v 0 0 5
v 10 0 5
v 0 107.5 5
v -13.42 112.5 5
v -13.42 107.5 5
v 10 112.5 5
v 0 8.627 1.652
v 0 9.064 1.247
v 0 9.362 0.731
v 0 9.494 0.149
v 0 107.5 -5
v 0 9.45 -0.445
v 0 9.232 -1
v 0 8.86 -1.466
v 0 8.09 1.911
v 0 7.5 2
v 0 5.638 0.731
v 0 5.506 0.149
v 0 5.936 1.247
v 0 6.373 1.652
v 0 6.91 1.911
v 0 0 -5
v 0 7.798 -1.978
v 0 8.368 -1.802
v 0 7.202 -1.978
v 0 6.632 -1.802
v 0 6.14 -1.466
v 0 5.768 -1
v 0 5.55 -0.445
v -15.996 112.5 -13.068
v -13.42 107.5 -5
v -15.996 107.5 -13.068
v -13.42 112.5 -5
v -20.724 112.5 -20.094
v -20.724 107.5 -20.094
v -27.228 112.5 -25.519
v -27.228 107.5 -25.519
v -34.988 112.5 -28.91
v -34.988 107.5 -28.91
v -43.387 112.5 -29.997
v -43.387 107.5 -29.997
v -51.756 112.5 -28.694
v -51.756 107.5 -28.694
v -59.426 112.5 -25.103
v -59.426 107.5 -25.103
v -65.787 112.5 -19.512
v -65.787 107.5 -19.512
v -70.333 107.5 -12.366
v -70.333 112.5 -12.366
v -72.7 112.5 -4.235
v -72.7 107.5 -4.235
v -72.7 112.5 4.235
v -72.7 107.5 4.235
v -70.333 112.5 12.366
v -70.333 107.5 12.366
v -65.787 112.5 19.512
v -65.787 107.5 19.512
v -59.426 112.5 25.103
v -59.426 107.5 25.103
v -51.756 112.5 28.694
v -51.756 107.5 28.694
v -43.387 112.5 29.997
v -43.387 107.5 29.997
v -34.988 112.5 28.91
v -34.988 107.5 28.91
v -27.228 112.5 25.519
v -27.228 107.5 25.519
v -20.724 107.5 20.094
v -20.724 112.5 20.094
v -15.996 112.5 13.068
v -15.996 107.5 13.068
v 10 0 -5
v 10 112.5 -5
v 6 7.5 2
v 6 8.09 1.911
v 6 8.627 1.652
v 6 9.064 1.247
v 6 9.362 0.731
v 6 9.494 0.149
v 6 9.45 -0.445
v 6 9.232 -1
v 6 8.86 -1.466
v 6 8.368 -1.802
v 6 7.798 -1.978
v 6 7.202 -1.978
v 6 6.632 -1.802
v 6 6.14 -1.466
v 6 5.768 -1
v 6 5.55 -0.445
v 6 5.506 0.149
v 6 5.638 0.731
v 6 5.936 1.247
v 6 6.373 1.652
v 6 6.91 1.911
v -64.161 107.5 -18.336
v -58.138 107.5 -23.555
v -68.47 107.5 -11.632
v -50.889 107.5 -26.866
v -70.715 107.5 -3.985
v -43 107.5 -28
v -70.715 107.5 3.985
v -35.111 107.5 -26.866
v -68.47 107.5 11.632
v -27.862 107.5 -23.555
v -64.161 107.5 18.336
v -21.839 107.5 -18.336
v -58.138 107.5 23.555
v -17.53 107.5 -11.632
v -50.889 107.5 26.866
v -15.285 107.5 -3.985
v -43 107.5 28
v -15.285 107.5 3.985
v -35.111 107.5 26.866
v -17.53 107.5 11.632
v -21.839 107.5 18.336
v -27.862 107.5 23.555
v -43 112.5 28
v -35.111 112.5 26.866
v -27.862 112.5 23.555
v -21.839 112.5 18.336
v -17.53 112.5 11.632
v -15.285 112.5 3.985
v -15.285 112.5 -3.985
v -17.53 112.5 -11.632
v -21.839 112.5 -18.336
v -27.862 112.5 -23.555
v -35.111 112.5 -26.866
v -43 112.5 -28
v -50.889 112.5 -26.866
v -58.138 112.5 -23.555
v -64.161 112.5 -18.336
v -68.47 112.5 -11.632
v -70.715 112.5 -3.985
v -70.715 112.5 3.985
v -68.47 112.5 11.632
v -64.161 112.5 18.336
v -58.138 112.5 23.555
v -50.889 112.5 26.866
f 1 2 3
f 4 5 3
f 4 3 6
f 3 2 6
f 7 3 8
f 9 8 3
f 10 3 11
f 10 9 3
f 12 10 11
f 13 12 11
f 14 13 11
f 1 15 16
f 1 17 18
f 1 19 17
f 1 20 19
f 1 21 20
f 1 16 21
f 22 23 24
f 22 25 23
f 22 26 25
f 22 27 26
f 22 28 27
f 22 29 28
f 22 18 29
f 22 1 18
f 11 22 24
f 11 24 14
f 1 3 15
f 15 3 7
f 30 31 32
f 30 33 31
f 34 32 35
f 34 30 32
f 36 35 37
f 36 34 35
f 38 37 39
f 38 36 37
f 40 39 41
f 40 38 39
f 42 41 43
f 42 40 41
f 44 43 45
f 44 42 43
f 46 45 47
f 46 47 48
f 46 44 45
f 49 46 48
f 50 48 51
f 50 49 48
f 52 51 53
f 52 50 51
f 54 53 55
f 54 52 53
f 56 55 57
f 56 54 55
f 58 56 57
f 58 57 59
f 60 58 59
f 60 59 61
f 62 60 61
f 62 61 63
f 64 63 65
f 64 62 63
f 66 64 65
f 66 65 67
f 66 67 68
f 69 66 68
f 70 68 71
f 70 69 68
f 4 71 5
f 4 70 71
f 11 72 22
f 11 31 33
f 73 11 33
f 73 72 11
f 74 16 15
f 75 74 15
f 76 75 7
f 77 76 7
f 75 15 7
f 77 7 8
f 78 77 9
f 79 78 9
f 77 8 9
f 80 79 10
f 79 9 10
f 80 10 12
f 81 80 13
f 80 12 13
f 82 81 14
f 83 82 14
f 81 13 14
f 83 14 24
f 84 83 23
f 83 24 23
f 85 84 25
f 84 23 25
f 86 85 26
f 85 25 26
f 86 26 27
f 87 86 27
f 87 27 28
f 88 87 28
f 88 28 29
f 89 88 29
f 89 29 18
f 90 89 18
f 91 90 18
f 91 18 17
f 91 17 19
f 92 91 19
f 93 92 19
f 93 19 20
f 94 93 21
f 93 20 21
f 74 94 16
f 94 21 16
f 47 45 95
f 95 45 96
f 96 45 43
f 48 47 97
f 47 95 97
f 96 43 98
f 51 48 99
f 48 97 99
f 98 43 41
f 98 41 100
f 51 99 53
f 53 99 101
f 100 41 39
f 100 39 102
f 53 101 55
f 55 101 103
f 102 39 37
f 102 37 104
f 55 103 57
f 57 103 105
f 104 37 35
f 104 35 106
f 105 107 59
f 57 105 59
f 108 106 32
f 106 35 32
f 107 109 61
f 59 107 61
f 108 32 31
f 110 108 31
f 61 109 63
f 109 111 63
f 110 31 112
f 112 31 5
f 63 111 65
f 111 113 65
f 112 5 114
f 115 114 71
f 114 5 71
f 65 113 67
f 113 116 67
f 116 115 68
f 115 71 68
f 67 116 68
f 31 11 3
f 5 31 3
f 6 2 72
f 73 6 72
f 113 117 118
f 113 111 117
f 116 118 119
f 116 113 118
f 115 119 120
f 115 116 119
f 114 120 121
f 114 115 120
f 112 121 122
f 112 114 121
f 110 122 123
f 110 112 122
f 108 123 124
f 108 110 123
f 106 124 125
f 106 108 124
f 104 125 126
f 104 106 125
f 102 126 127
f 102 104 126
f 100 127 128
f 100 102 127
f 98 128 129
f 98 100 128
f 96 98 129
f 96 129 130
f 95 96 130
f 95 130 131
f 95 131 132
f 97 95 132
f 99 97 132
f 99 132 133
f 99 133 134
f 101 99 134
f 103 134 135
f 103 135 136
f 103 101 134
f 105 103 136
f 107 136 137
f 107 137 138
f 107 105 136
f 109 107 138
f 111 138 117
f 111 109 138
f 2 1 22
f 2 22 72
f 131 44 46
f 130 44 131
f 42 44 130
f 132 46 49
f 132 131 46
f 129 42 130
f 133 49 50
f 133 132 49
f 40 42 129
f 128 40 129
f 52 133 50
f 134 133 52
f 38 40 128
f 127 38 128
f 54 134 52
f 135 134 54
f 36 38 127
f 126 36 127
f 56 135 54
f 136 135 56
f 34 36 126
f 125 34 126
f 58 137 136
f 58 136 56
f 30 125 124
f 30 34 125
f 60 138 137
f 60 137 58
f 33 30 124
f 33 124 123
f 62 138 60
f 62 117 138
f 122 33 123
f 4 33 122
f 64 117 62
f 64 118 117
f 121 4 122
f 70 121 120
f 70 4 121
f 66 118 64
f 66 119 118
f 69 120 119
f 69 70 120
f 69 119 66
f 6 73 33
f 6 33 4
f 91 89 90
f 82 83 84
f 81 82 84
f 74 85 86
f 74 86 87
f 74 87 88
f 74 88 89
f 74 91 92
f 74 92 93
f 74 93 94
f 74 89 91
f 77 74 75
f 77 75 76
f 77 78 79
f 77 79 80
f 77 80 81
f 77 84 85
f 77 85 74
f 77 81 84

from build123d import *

# Parameters (mm, degrees)
ESQUISSE3_W             = 10
ESQUISSE3_H             = 70
BOSS_EXTRU_1_DEPTH      = 5
ESQUISSE8_R             = 30
ESQUISSE8_R_2           = 28
BOSS_EXTRU_4_DEPTH      = 2.5
ESQUISSE8_W             = 22
ESQUISSE8_H             = 10
BOSS_EXTRU_4_2_DEPTH    = 2.5
BOSS_EXTRU_5_REACH      = 107.494
ESQUISSE9_W             = 10
ESQUISSE9_H             = 10
BOSS_EXTRU_6_REACH      = 133.443
ESQUISSE10_W            = 10
ESQUISSE10_H            = 5
ESQUISSE11_R            = 2
ENL_V_MAT_EXTRU_1_DEPTH = 6


with BuildPart() as part:
    # Esquisse3 → Boss.-Extru.1 (new, symmetric)
    with BuildSketch(Plane.XY):
        with Locations((5, 35)):
            Rectangle(ESQUISSE3_W, ESQUISSE3_H)
    extrude(amount=BOSS_EXTRU_1_DEPTH, both=True)


with BuildPart() as body_2:
    # Esquisse8 → Boss.-Extru.4 (new, symmetric)
    with BuildSketch(Plane(origin=(0, 110, 0), x_dir=(1, 0, 0), z_dir=(0, 1, 0))):
        with Locations(Location((-43, 0, 0), (0, 0, 270))):
            Circle(ESQUISSE8_R)
        with Locations(Location((-43, 0, 0), (0, 0, 270))):
            Circle(ESQUISSE8_R_2, mode=Mode.SUBTRACT)
    extrude(amount=BOSS_EXTRU_4_DEPTH, both=True)

    # Esquisse10 → Boss.-Extru.6 (add, up to next)
    with BuildSketch(Plane.ZY.offset(12), mode=Mode.PRIVATE) as boss_extru_6_sk1:
        with Locations((0, 110)):
            Rectangle(ESQUISSE10_W, ESQUISSE10_H)
    boss_extru_6_tool1 = extrude(boss_extru_6_sk1.sketch, amount=BOSS_EXTRU_6_REACH, mode=Mode.PRIVATE) - body_2.part


with BuildPart() as body_3:
    # Esquisse8 → Boss.-Extru.4 2 (new, symmetric)
    with BuildSketch(Plane(origin=(0, 110, 0), x_dir=(1, 0, 0), z_dir=(0, 1, 0))):
        with Locations((-1, 0)):
            Rectangle(ESQUISSE8_W, ESQUISSE8_H)
    extrude(amount=BOSS_EXTRU_4_2_DEPTH, both=True)

    # Esquisse9 → Boss.-Extru.5 (add, up to next)
    with BuildSketch(Plane(origin=(0, 70, 0), x_dir=(1, 0, 0), z_dir=(0, 1, 0)), mode=Mode.PRIVATE) as boss_extru_5_sk1:
        with Locations((5, 0)):
            Rectangle(ESQUISSE9_W, ESQUISSE9_H)
    boss_extru_5_tool1 = extrude(boss_extru_5_sk1.sketch, amount=BOSS_EXTRU_5_REACH, mode=Mode.PRIVATE) - body_3.part

    add(part.part)  # Boss.-Extru.5 merges part
    add(boss_extru_5_tool1.solids().sort_by_distance((5, 70, 0))[0])


with BuildPart() as body_2_1:
    add(body_2.part)

    add(body_3.part)  # Boss.-Extru.6 merges body 3
    add(boss_extru_6_tool1.solids().sort_by_distance((-12, 110, 0))[0])

    # Esquisse11 → Enlèv. mat.-Extru.1 (cut)
    with BuildSketch(Plane.ZY):
        with Locations((0, 7.5)):
            Circle(ESQUISSE11_R)
    extrude(amount=-ENL_V_MAT_EXTRU_1_DEPTH, mode=Mode.SUBTRACT)


solid = body_2_1.part
